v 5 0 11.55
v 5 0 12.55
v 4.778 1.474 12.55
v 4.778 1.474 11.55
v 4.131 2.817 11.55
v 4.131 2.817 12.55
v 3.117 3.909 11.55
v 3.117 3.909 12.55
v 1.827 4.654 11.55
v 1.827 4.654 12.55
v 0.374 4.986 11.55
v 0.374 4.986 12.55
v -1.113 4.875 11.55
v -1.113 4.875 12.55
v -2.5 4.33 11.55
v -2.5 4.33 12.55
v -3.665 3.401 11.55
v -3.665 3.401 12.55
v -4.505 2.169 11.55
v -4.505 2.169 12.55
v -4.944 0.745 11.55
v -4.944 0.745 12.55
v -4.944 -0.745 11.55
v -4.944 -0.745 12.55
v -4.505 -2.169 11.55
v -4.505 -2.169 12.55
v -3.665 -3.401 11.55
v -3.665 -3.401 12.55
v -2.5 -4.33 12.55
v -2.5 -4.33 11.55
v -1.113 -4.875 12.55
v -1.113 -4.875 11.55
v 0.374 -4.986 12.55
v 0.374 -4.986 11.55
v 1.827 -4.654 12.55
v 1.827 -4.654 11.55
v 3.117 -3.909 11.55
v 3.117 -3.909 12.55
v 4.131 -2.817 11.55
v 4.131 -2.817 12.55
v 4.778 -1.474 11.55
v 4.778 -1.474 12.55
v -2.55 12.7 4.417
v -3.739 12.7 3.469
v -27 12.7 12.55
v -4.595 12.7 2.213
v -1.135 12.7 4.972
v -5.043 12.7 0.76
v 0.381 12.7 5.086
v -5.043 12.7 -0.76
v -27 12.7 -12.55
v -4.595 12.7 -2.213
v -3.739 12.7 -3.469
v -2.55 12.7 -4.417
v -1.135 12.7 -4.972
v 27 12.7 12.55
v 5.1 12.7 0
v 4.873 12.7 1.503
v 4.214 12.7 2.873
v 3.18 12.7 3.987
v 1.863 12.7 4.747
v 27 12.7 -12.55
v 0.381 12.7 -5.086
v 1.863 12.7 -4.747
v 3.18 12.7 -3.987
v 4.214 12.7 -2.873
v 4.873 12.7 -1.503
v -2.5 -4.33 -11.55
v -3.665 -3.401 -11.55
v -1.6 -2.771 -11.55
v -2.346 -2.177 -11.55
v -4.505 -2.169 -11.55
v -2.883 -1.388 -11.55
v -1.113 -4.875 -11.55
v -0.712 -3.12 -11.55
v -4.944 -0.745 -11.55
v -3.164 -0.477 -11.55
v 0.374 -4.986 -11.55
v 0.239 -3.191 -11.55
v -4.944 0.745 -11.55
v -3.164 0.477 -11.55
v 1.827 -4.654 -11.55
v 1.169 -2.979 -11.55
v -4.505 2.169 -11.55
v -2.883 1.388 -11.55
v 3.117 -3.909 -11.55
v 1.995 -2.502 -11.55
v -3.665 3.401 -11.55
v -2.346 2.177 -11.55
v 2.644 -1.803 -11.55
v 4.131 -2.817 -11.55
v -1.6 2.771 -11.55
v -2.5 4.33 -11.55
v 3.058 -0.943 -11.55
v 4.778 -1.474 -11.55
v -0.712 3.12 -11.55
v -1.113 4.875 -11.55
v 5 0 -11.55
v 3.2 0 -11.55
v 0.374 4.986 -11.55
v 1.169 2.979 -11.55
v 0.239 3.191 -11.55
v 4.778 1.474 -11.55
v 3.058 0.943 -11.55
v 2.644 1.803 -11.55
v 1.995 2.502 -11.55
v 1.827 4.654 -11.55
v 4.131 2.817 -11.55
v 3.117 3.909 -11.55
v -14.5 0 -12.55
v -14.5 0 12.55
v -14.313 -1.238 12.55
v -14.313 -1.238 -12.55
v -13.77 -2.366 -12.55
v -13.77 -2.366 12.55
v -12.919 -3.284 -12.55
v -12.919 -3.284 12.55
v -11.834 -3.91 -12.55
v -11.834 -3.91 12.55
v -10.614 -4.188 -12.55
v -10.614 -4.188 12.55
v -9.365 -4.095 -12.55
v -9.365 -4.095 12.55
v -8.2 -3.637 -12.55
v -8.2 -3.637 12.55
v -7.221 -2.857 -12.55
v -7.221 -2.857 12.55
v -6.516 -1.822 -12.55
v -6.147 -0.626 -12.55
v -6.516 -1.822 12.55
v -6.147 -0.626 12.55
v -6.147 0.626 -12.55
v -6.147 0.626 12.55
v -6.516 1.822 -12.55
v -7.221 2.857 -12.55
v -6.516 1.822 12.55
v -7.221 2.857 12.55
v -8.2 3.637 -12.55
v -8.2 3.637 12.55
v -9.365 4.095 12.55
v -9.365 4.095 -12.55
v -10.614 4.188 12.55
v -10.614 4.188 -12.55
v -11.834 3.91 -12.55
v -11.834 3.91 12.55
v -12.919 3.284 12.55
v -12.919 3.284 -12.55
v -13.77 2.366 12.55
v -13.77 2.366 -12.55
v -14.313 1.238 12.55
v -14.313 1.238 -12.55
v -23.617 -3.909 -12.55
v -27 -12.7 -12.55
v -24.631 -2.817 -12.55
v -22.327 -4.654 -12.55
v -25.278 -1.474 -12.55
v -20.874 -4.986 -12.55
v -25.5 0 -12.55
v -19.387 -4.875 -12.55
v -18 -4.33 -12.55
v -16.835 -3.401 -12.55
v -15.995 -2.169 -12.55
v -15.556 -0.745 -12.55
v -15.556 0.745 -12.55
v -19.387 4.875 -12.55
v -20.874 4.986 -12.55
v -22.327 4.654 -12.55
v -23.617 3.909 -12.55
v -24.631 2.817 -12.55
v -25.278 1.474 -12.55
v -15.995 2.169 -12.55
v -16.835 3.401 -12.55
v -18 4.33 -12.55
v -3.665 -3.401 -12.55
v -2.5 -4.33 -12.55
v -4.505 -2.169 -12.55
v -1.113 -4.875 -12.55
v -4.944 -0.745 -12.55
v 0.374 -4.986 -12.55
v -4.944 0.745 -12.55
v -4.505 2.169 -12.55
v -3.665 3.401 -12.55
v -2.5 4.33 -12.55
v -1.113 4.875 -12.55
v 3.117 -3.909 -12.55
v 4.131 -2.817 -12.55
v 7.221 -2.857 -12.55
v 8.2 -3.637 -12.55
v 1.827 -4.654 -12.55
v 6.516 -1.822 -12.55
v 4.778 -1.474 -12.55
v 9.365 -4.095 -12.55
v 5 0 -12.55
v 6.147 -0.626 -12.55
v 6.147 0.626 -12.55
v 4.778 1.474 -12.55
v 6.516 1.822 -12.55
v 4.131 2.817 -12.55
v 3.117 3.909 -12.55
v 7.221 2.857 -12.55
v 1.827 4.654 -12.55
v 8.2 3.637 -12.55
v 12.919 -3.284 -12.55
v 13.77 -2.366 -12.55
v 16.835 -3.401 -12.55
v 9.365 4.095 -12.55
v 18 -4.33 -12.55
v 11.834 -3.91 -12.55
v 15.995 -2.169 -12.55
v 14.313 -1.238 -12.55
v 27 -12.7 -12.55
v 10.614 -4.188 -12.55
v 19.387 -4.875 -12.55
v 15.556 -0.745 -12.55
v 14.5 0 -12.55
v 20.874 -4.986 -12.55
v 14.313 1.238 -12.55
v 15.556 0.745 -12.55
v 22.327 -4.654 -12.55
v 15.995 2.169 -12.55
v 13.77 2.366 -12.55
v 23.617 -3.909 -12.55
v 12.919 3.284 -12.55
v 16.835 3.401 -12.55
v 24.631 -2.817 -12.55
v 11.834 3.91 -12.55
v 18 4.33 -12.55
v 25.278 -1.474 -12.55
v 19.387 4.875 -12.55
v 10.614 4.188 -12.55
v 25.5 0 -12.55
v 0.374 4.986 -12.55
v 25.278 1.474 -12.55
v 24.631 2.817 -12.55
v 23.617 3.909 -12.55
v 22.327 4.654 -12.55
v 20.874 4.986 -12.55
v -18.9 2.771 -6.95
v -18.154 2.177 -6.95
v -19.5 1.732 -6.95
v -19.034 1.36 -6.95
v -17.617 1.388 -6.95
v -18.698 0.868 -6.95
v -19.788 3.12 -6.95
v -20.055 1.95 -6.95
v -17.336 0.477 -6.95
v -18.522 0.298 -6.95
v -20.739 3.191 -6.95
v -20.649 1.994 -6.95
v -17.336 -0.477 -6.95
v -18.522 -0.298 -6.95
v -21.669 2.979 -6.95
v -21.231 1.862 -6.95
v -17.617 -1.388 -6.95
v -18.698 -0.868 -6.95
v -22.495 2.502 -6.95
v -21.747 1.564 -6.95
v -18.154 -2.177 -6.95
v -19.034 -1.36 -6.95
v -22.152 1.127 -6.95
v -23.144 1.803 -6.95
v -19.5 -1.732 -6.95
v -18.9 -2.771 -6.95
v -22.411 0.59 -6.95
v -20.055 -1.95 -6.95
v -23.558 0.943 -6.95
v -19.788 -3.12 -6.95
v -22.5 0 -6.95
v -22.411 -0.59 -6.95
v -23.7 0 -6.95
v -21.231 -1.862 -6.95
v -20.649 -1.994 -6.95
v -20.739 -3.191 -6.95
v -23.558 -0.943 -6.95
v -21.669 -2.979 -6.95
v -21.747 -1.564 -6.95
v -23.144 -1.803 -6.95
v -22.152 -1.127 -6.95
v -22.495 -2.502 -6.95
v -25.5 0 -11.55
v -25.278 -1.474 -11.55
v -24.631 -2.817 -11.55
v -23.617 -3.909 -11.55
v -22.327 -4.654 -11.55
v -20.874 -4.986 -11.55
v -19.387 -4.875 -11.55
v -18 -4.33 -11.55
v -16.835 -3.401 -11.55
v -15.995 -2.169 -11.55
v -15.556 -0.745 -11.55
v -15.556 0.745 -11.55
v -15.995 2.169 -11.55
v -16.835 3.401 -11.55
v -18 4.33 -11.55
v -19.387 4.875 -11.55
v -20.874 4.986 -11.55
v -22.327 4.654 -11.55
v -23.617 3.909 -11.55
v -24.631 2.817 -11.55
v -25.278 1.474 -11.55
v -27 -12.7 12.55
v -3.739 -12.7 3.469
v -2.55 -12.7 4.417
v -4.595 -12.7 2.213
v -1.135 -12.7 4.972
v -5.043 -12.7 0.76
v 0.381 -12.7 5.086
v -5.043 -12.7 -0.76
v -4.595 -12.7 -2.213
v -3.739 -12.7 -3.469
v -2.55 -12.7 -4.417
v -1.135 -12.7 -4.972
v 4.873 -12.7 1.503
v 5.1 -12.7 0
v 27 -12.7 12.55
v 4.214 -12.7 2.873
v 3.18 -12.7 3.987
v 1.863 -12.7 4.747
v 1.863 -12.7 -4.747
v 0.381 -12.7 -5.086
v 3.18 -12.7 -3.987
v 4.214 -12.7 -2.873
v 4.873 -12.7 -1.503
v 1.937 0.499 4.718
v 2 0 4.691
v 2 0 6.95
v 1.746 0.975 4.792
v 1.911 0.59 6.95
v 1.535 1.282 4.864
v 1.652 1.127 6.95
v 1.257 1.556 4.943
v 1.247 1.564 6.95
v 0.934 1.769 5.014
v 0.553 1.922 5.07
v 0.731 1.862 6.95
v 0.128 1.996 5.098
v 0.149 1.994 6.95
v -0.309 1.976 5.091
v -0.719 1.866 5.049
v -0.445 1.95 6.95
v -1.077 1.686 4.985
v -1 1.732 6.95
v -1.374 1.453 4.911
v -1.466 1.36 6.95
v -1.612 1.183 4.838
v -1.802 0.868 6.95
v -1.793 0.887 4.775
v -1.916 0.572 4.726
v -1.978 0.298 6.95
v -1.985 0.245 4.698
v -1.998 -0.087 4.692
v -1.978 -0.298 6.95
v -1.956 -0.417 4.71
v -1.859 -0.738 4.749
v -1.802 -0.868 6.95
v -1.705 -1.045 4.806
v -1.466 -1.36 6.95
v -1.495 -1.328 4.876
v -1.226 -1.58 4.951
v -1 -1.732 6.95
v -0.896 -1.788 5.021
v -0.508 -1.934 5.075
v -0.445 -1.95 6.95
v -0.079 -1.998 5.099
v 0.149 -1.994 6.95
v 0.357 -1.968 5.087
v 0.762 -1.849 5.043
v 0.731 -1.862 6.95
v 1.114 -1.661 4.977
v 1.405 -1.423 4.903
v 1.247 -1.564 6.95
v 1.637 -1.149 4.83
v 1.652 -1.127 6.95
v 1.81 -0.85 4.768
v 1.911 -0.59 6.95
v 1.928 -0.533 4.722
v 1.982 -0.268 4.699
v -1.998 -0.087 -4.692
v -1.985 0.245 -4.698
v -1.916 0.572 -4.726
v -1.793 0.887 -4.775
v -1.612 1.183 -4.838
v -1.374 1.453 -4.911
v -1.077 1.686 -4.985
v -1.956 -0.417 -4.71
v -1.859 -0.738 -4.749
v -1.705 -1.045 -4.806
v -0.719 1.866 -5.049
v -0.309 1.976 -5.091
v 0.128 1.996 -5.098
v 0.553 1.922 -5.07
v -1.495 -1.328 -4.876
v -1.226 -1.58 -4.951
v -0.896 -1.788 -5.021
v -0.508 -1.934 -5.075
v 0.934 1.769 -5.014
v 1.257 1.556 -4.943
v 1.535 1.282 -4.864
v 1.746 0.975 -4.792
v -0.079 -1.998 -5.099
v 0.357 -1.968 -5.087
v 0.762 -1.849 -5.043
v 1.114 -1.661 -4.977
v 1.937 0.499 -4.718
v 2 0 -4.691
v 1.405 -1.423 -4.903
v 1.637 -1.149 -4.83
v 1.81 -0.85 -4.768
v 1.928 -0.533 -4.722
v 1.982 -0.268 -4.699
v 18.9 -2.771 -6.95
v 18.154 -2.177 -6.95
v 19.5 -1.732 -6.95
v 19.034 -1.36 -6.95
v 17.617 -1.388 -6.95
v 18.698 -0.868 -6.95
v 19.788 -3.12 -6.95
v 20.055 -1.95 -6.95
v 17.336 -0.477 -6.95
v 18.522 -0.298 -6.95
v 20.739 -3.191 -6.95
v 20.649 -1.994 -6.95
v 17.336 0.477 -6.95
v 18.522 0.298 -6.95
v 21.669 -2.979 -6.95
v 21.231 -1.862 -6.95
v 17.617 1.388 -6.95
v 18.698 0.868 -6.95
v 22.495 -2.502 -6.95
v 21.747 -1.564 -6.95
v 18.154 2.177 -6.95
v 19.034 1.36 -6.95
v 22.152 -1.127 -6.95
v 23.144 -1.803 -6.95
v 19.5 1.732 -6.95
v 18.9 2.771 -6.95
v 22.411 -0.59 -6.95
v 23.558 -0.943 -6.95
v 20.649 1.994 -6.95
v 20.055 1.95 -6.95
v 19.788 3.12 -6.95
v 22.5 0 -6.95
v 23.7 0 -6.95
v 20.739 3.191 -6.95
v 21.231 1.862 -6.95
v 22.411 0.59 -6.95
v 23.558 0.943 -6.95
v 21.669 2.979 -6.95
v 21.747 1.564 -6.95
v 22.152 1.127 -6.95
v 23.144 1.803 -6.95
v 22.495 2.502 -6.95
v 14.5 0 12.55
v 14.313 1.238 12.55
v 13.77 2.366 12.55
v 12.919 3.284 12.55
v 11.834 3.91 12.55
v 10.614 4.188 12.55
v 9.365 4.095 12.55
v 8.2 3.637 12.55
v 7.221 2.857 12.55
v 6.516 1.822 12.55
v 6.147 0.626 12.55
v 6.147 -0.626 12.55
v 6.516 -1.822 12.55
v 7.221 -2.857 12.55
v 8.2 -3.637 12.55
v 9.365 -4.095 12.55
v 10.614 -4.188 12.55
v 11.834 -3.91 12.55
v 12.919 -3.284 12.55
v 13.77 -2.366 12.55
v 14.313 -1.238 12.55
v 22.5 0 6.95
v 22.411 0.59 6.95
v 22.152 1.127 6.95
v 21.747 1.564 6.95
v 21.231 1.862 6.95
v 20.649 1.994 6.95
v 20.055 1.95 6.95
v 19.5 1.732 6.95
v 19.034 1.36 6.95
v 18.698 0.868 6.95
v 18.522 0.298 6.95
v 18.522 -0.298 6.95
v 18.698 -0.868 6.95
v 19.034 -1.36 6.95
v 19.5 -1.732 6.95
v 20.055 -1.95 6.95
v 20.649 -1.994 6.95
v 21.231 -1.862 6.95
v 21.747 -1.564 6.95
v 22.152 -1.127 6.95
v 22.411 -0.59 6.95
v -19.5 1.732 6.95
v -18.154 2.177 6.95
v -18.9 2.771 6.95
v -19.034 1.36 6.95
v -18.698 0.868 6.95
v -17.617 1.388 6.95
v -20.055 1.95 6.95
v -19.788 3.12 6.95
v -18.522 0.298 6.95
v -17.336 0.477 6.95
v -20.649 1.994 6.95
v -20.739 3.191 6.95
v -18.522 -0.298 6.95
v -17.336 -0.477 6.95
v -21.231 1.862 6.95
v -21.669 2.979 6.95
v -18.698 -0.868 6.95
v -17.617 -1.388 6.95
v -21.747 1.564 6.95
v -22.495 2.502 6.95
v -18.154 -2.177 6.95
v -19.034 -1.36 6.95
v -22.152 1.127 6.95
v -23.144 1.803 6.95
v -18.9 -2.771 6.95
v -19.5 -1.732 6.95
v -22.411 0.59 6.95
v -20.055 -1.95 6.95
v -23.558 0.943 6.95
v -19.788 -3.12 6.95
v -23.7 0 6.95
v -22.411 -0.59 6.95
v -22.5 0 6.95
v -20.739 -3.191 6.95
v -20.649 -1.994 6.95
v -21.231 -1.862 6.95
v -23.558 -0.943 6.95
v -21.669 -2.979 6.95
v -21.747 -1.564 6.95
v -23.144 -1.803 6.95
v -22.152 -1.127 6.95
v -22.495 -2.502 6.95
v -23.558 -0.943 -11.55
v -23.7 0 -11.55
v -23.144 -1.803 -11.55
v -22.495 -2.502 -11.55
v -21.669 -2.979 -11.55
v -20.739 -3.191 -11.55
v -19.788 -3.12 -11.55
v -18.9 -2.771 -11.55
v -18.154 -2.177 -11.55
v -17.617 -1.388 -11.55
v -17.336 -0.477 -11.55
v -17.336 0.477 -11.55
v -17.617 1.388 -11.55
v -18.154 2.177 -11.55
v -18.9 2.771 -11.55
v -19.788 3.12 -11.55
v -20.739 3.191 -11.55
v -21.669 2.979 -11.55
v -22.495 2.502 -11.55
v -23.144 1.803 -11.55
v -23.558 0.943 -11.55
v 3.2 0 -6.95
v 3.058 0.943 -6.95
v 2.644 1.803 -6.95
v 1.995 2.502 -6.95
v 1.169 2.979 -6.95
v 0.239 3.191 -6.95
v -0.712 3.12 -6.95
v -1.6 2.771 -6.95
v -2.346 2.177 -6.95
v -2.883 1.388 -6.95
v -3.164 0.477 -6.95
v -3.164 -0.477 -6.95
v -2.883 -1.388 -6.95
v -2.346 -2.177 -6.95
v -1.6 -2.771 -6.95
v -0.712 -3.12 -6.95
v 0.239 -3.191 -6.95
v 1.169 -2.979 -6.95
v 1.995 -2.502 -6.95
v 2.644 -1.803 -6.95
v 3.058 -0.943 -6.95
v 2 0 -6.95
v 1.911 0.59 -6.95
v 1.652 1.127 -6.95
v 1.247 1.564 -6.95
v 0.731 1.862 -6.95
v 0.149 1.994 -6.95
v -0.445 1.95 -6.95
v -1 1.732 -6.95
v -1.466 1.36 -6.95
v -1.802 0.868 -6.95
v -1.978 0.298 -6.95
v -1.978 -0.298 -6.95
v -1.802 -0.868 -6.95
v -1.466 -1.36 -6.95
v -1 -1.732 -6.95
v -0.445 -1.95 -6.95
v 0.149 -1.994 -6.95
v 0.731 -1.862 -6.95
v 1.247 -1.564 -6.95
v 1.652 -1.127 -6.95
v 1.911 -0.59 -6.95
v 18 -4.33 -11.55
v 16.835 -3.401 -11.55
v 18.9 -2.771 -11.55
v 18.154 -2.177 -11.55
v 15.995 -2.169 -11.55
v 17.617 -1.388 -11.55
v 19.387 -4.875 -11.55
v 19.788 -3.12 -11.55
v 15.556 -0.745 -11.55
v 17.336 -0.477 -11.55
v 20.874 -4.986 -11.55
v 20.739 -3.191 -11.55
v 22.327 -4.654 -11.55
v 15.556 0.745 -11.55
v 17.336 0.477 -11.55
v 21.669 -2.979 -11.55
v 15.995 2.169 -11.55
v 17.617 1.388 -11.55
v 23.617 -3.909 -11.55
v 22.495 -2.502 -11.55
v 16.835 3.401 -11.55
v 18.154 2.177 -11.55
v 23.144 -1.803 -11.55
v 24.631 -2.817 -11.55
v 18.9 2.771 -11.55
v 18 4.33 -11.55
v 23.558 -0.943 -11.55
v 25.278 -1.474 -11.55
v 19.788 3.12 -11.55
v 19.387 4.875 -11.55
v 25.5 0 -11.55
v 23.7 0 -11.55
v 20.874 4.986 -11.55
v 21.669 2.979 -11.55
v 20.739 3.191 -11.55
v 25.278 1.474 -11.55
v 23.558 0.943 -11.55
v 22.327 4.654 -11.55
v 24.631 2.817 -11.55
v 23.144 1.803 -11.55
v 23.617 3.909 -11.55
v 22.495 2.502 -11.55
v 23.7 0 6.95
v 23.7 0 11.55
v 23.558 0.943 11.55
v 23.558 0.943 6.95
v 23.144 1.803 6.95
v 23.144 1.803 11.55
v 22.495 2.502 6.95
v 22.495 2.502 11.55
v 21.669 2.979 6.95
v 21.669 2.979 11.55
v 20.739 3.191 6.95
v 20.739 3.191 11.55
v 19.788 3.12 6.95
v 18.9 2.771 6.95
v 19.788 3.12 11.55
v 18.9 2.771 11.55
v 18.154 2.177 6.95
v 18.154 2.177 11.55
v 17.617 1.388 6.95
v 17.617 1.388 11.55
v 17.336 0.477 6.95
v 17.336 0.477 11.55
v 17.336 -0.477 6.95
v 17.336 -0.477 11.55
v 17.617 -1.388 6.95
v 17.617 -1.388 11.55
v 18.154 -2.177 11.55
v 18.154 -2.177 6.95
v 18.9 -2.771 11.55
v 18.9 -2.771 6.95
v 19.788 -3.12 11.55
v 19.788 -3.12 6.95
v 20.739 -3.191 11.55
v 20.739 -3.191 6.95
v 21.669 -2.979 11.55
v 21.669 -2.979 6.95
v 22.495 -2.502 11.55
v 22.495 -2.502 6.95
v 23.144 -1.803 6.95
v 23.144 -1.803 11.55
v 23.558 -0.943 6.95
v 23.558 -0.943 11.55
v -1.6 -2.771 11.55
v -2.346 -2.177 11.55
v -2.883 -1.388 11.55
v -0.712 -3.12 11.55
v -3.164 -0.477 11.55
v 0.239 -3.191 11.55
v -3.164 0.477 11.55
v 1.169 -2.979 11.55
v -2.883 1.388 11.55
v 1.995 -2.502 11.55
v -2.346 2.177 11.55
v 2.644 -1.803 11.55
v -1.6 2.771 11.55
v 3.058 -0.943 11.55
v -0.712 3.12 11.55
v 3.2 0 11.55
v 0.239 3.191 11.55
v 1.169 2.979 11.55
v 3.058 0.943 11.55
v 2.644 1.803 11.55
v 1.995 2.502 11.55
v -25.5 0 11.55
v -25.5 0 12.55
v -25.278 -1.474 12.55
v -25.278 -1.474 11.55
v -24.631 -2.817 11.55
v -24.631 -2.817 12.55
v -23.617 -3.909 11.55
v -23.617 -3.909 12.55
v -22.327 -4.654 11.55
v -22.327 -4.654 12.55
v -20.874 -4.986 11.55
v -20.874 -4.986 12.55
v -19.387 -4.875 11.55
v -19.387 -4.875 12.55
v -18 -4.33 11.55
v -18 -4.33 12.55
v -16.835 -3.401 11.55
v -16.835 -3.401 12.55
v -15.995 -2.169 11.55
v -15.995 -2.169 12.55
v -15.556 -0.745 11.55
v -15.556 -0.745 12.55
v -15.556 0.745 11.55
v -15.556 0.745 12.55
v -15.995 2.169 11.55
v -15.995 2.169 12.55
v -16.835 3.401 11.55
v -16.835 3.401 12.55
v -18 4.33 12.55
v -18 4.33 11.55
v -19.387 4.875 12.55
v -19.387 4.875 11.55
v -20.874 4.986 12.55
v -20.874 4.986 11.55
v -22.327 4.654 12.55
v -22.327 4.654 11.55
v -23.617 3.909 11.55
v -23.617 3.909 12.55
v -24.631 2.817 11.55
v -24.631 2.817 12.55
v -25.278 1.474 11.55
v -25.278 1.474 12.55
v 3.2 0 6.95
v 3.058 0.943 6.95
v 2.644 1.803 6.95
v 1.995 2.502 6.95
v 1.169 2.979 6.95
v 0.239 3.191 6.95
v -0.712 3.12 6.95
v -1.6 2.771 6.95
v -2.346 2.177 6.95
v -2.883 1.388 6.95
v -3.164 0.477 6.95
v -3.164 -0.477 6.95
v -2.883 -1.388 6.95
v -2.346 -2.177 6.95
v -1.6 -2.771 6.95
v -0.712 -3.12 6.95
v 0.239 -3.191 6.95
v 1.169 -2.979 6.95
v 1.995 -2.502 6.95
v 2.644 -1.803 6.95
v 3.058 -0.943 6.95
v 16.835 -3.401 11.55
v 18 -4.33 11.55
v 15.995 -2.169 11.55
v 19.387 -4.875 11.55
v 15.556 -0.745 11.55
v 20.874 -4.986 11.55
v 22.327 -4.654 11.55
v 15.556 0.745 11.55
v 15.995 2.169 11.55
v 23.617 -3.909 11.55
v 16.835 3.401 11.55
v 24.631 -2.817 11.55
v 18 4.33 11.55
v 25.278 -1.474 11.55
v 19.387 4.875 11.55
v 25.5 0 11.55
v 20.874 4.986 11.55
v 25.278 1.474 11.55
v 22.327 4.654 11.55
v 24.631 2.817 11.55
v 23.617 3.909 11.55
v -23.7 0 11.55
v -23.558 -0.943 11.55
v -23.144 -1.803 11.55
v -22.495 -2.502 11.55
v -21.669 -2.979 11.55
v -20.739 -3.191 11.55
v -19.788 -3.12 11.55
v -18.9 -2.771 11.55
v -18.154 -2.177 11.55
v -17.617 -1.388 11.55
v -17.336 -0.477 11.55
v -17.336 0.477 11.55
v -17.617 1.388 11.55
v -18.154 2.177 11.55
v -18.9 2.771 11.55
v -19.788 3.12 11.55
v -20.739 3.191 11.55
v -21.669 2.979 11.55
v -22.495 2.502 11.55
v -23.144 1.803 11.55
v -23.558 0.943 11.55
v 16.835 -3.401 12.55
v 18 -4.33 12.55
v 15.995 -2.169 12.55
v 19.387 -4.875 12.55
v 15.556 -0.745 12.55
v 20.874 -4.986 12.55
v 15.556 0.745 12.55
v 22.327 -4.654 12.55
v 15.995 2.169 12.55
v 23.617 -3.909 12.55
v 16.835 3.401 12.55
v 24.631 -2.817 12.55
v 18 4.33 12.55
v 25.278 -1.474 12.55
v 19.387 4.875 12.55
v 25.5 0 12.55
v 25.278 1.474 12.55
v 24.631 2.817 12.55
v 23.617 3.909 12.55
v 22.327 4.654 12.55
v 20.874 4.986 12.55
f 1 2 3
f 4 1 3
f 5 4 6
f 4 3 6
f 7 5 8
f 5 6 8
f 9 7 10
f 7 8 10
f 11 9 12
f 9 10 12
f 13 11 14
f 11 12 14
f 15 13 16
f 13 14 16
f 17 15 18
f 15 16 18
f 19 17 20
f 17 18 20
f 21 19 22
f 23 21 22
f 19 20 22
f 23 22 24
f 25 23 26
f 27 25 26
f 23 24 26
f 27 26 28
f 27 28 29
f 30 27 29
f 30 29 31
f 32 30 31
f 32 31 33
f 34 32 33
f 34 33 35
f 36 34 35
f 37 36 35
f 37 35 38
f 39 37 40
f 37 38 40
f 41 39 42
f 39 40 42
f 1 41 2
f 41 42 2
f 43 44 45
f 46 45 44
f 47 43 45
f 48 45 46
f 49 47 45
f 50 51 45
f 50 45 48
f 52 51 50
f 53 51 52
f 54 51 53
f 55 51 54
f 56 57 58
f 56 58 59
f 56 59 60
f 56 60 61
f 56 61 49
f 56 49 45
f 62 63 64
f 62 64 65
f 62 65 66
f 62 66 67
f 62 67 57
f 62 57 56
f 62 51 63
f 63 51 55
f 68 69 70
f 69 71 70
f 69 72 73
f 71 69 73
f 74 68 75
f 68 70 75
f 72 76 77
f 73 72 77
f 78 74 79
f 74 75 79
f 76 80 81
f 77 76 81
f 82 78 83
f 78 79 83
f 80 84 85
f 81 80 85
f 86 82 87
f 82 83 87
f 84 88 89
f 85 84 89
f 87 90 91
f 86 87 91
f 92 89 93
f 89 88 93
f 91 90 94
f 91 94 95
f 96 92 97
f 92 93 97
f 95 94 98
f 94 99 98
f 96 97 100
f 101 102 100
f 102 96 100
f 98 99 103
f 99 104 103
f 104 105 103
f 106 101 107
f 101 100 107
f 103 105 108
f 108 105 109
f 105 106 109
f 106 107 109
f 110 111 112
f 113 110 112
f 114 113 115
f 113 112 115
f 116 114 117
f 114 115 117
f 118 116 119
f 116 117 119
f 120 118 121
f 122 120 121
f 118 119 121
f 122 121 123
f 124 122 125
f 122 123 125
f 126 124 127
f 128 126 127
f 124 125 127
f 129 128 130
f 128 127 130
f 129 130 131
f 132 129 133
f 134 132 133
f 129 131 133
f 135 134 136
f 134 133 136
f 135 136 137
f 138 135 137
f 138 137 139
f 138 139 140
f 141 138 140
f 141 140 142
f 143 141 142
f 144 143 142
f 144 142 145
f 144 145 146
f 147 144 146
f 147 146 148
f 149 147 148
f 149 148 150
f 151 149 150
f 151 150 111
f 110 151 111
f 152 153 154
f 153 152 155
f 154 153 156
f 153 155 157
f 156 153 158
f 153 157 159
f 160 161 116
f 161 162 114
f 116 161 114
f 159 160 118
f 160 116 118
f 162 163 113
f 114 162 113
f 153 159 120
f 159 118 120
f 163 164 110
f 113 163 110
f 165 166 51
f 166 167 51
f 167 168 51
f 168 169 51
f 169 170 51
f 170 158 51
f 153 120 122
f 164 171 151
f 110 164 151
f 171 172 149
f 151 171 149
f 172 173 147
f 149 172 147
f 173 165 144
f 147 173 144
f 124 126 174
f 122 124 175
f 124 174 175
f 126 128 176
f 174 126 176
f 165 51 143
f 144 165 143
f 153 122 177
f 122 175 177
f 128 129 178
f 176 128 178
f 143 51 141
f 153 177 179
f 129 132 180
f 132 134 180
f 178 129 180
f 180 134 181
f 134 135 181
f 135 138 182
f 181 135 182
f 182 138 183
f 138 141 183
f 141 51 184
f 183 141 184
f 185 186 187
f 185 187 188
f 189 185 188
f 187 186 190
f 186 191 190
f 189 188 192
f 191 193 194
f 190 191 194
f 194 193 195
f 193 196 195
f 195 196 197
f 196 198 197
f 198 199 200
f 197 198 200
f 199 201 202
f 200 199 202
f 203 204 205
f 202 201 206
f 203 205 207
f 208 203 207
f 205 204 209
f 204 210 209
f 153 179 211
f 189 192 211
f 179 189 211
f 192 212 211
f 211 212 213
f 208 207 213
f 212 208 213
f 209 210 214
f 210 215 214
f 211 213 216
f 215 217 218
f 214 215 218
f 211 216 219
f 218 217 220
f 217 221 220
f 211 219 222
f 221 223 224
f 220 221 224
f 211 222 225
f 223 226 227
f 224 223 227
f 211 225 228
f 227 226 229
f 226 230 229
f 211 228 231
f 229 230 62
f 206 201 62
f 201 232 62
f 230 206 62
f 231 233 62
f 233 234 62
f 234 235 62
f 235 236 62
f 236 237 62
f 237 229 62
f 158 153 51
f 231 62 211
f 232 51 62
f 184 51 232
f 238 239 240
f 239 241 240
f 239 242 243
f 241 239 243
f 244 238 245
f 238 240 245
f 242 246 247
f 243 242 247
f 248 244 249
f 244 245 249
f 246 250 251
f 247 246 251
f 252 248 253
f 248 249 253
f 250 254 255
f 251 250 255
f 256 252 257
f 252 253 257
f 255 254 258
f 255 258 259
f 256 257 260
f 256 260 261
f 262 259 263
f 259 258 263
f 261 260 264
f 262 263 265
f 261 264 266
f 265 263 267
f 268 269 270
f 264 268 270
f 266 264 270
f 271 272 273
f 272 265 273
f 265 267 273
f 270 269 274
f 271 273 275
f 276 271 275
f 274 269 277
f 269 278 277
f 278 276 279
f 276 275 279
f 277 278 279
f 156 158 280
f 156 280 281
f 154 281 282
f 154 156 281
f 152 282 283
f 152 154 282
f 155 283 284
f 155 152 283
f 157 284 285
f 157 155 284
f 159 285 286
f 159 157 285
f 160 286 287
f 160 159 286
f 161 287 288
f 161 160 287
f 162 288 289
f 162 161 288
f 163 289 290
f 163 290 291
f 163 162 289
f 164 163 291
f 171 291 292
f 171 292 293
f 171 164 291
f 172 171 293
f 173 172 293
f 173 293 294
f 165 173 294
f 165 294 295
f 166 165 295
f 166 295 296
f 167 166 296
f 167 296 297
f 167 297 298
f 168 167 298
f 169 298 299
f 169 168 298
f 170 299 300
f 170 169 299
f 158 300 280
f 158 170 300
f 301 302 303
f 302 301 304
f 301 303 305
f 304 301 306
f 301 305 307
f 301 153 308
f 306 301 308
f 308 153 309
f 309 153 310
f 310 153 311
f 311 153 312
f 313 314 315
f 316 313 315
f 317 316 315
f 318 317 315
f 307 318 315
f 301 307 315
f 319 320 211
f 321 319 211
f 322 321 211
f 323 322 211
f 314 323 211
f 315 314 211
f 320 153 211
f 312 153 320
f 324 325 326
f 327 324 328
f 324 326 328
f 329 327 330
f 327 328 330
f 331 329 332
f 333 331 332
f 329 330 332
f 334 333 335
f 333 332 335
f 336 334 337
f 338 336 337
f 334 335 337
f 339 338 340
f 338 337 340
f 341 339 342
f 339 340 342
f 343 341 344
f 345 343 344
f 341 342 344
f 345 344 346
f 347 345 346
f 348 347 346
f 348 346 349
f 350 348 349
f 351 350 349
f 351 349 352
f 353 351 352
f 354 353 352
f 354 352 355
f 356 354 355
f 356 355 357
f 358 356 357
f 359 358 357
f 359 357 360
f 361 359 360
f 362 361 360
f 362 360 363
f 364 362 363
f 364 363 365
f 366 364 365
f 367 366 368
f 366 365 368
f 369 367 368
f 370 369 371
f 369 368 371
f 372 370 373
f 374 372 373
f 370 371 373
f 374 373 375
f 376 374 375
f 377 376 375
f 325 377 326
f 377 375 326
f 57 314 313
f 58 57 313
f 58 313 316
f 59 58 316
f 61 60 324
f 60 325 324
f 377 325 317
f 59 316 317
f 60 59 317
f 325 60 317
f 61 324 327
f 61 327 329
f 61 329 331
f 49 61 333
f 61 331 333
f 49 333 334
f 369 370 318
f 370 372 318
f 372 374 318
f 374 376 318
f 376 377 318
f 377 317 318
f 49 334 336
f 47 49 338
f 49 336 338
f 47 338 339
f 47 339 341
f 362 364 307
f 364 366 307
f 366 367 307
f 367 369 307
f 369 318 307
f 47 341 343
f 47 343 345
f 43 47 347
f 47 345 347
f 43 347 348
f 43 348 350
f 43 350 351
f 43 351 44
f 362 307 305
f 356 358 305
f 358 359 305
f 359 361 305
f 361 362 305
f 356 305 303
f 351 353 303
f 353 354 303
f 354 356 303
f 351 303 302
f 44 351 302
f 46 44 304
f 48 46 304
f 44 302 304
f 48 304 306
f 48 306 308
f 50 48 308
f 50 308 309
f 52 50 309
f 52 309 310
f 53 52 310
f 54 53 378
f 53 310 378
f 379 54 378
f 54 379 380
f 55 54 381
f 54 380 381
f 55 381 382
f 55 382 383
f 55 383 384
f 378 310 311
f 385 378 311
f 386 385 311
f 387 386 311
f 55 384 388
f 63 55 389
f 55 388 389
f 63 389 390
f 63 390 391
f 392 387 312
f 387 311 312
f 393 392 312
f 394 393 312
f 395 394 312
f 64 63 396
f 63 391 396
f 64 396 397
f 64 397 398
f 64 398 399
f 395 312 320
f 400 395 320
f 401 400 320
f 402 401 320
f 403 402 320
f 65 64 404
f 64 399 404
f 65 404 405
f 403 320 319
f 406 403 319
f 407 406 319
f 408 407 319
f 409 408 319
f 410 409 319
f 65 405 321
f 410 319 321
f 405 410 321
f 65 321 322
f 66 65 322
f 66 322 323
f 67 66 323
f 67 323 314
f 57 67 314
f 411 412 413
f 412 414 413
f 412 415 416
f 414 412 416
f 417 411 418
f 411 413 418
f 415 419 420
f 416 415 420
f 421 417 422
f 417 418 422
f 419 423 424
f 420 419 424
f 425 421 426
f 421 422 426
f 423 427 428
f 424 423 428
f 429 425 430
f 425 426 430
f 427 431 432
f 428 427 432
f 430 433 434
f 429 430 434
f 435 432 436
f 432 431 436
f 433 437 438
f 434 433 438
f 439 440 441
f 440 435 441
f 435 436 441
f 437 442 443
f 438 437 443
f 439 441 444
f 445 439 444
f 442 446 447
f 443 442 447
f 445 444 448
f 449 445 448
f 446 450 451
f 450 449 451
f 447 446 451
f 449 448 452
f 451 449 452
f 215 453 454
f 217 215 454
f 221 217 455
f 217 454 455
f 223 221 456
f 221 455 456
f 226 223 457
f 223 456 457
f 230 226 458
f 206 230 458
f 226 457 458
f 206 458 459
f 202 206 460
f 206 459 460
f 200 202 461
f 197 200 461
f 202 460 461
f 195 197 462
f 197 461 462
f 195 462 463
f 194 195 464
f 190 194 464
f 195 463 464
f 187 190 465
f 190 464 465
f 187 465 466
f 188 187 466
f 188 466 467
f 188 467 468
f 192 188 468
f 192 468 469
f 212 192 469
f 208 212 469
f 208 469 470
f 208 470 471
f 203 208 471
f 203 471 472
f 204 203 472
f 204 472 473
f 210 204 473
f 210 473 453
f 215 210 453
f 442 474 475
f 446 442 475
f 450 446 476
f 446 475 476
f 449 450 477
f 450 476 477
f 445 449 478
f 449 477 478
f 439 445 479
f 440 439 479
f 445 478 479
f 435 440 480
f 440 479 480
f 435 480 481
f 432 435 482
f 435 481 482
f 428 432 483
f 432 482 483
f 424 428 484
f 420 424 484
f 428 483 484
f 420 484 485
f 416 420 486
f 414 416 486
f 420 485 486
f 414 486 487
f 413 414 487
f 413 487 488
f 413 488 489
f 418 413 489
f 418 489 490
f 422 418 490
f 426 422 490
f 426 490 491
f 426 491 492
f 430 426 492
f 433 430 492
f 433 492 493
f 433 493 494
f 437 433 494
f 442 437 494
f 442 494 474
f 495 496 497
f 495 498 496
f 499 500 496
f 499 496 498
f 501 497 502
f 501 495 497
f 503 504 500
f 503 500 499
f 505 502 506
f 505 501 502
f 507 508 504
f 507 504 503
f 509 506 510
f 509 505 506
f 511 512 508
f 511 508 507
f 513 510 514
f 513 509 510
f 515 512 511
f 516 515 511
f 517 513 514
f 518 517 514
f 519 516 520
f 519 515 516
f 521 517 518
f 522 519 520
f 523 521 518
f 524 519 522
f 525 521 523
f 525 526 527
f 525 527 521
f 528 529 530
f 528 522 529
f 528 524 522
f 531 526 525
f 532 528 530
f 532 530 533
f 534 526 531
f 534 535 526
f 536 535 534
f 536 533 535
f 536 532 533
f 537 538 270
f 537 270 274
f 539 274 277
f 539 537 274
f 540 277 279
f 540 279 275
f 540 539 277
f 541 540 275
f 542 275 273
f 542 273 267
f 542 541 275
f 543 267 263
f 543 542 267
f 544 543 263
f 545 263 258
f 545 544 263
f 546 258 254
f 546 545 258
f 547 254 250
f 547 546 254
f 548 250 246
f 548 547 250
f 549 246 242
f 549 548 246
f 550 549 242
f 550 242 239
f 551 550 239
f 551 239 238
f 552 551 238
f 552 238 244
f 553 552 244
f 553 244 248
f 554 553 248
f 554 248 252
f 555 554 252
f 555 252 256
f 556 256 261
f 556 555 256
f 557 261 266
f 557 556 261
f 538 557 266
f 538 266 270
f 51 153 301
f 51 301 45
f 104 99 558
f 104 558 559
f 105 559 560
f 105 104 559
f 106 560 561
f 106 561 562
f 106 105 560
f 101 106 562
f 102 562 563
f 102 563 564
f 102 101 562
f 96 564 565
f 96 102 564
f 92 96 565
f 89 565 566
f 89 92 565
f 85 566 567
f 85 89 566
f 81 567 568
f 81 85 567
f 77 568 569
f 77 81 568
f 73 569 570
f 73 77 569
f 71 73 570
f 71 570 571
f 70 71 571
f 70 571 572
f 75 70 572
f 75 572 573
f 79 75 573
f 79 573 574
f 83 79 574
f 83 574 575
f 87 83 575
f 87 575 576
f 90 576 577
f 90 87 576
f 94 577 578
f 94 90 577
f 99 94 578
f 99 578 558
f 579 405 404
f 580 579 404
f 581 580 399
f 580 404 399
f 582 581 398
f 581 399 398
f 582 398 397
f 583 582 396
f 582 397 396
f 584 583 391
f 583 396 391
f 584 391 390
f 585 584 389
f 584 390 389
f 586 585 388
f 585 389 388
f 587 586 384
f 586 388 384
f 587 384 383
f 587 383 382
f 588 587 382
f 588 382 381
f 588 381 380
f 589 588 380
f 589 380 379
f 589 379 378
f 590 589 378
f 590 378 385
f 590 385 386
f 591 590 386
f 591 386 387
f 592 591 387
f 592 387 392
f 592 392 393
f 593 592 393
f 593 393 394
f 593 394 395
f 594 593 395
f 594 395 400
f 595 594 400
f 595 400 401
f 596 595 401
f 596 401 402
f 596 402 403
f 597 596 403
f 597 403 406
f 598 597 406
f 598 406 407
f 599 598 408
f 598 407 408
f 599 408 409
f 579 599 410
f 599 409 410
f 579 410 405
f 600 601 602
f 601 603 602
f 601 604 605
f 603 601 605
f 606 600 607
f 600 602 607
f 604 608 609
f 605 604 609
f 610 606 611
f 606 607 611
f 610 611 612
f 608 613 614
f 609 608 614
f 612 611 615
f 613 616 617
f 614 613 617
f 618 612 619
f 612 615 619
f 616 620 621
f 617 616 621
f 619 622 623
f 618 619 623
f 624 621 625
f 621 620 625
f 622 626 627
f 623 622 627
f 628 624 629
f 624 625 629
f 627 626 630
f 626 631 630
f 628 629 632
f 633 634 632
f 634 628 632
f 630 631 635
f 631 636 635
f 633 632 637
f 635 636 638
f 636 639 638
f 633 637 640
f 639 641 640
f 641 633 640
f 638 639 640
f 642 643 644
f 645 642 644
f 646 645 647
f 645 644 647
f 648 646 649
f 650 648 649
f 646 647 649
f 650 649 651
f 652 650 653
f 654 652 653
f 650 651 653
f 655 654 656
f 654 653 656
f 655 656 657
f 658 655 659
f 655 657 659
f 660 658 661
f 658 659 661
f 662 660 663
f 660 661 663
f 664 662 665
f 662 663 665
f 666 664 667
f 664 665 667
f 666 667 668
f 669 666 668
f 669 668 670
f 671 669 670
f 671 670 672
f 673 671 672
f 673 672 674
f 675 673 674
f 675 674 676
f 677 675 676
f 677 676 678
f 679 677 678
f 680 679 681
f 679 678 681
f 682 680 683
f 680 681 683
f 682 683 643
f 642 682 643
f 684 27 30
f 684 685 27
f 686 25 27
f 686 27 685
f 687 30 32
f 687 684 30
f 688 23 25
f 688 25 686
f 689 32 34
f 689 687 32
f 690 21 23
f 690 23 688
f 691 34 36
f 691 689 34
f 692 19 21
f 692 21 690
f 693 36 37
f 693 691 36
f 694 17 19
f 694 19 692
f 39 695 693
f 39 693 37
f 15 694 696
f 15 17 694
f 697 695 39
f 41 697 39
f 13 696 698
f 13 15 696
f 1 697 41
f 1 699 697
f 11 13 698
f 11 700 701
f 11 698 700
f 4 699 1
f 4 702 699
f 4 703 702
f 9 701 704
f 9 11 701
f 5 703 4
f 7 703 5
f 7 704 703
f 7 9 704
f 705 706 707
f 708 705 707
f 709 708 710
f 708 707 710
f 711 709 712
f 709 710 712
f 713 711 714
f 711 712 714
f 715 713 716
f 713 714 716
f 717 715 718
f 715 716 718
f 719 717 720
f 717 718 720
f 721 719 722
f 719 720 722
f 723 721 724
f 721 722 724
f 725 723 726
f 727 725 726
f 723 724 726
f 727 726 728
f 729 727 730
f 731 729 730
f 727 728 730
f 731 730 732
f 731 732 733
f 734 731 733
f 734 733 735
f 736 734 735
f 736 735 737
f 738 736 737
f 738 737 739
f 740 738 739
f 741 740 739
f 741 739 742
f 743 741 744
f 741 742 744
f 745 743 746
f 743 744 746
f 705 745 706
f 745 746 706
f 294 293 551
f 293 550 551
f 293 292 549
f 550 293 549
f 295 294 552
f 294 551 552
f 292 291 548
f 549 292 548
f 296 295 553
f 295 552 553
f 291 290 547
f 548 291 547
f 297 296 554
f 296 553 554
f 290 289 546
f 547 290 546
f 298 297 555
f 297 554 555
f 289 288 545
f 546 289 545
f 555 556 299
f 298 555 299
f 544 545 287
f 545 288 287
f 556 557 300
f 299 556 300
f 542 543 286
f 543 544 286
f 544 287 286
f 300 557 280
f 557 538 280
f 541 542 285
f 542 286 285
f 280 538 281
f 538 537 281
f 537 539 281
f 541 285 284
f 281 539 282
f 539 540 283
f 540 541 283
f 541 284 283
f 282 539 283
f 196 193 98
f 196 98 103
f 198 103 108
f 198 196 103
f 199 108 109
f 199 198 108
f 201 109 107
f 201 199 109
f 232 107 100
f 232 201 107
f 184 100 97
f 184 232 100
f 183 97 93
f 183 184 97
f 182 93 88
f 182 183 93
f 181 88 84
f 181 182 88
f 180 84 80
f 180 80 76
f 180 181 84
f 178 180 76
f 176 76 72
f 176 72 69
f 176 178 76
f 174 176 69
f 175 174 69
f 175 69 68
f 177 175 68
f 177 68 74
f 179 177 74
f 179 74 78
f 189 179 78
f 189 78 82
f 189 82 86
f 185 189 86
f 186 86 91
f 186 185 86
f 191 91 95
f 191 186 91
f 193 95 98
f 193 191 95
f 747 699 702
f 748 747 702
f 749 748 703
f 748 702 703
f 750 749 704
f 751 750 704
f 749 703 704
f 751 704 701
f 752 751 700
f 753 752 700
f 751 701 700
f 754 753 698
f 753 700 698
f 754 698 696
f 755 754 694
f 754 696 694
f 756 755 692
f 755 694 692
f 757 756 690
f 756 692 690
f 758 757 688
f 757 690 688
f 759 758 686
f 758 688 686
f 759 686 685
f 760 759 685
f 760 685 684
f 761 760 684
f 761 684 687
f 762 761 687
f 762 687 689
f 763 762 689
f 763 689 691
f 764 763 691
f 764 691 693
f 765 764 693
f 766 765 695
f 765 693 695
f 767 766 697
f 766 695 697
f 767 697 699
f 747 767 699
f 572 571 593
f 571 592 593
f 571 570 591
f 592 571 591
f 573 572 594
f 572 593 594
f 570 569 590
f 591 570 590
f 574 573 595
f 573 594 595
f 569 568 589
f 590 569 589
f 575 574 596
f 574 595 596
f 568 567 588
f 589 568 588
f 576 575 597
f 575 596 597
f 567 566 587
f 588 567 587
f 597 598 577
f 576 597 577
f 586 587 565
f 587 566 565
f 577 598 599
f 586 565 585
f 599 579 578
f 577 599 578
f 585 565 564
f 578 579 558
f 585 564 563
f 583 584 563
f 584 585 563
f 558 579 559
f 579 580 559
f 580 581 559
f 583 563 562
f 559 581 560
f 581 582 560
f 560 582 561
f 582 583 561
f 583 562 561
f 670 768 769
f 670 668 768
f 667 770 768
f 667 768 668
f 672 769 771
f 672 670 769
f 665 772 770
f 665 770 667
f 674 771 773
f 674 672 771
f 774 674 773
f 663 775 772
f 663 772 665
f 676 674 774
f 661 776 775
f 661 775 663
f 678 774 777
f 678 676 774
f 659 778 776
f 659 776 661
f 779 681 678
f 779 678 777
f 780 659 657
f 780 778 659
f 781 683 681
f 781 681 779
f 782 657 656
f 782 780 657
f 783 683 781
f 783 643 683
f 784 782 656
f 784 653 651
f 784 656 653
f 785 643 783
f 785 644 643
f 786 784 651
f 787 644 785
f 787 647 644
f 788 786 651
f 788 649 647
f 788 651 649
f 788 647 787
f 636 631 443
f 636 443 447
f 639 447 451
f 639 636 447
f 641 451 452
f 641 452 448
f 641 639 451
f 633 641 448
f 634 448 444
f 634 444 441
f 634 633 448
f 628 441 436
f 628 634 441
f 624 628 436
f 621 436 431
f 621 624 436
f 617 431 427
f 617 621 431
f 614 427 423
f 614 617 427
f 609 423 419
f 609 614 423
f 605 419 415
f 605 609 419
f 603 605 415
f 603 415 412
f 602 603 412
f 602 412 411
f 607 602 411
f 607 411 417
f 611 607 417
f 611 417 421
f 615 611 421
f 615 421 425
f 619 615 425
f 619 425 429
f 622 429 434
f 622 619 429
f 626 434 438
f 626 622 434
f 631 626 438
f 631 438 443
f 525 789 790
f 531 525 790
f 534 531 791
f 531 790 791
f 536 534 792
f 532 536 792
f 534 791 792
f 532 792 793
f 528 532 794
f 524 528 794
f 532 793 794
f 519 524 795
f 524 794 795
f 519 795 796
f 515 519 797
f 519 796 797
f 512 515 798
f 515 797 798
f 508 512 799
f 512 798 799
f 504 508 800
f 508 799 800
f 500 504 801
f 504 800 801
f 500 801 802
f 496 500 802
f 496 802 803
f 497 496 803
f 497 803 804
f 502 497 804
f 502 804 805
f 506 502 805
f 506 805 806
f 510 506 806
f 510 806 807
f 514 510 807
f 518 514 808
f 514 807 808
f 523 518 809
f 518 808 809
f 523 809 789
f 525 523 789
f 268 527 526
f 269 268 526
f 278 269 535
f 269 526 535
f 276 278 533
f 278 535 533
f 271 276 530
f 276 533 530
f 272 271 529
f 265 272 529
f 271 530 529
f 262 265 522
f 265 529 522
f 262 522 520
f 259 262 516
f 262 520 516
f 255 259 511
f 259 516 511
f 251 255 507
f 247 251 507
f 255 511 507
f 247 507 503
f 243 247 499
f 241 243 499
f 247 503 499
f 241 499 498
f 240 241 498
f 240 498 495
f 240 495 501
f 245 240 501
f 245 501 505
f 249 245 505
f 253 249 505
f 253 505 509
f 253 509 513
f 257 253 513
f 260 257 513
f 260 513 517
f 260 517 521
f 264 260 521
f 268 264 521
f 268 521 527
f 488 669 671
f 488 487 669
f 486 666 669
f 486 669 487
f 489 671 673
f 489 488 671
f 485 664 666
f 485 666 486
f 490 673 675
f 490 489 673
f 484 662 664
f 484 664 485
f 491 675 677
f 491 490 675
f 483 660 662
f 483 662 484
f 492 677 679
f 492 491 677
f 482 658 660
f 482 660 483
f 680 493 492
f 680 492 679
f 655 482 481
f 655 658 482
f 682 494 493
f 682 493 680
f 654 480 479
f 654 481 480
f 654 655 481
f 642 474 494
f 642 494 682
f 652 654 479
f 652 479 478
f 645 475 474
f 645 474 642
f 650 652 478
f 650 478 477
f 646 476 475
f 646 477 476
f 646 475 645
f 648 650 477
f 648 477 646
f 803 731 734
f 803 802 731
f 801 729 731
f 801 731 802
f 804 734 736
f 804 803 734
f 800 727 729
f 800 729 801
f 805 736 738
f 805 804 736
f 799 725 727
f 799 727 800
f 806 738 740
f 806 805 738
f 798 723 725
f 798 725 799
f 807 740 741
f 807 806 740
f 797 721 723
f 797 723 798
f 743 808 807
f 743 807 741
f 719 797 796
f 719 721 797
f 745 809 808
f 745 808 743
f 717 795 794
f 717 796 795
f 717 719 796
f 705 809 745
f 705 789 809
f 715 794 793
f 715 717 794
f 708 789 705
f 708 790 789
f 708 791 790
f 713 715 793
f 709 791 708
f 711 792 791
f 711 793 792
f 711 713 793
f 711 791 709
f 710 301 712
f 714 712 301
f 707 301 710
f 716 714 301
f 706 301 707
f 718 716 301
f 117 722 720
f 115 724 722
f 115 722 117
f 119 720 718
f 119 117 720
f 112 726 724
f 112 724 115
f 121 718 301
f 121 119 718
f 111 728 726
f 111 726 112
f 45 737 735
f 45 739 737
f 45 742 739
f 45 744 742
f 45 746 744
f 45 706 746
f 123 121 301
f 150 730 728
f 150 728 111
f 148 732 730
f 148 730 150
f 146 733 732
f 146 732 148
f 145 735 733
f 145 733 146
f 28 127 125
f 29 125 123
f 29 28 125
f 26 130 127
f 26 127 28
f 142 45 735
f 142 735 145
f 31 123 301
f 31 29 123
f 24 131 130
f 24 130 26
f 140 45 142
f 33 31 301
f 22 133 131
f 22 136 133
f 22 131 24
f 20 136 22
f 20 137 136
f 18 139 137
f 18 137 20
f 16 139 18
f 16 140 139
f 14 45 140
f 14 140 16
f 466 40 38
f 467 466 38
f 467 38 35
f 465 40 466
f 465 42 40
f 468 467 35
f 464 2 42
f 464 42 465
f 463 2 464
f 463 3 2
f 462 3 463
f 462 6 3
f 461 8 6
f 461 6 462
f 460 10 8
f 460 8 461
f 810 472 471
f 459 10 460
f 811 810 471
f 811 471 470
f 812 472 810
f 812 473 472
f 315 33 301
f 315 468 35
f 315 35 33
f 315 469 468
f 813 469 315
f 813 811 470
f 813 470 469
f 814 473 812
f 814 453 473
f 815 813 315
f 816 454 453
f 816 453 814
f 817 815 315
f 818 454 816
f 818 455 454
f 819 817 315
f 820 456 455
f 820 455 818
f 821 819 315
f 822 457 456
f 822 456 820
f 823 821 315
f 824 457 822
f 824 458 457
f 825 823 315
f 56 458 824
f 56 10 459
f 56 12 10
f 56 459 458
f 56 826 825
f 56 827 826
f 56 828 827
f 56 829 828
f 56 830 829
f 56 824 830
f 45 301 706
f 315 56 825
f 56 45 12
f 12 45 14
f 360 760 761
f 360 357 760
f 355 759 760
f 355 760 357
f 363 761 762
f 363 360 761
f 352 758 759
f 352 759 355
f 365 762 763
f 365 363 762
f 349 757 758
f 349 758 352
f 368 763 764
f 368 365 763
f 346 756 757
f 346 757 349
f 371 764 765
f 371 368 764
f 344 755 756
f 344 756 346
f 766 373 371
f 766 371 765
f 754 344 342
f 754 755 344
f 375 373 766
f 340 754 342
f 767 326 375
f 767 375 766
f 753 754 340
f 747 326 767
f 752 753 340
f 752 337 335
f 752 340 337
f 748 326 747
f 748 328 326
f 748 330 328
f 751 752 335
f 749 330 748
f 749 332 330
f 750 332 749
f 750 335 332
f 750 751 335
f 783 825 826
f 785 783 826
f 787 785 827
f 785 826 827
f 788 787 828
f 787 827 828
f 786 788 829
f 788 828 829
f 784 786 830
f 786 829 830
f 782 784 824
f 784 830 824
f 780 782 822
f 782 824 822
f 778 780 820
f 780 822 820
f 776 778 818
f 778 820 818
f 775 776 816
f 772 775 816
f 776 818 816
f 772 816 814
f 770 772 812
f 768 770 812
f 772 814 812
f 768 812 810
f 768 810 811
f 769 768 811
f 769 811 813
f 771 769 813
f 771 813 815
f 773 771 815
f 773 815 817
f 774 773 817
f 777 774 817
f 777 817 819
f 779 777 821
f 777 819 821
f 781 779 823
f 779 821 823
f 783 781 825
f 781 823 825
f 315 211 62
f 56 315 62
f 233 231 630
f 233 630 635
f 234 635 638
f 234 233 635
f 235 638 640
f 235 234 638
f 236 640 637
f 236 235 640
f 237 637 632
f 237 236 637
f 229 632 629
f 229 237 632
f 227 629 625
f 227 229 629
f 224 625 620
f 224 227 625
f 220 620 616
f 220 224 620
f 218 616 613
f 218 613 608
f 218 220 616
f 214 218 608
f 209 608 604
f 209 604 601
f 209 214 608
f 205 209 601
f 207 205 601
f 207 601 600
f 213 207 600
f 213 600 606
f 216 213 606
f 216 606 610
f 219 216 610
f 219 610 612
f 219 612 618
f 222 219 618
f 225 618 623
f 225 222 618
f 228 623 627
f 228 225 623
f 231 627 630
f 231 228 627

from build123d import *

# Parameters (mm, degrees)
BOSS_EXTRUDE1_DEPTH      = 12.55
BOSS_EXTRUDE1_DEPTH_BACK = 12.55
SKETCH1_W                = 54
SKETCH1_H                = 25.4
CUT_EXTRUDE1_REACH       = 41.136
SKETCH3_R                = 5.1
SKETCH5_R                = 5
CUT_EXTRUDE2_DEPTH       = 1
SKETCH6_R                = 3.2
CUT_EXTRUDE3_DEPTH       = 4.6
CUT_EXTRUDE4_REACH       = 37.645
SKETCH7_R                = 2
CUT_EXTRUDE5_REACH       = 40.991
SKETCH8_R                = 4.2
SKETCH9_R                = 5
CUT_EXTRUDE6_DEPTH       = 1
SKETCH10_R               = 3.2
CUT_EXTRUDE7_DEPTH       = 4.6
SKETCH11_R               = 2
CUT_EXTRUDE8_DEPTH       = 36.64463494


with BuildPart() as part:
    # Sketch1 → Boss-Extrude1 (new, two sides: drawn at the far end of the back side and taken through both)
    with BuildSketch(Plane.XY.offset(-BOSS_EXTRUDE1_DEPTH_BACK)):
        Rectangle(SKETCH1_W, SKETCH1_H)
    extrude(amount=BOSS_EXTRUDE1_DEPTH + BOSS_EXTRUDE1_DEPTH_BACK)

    # Sketch3 → Cut-Extrude1 (cut, up to next)
    with BuildSketch(Plane.XZ.offset(12.7), mode=Mode.PRIVATE) as cut_extrude1_sk1:
        Circle(SKETCH3_R)
    cut_extrude1_tool1 = extrude(cut_extrude1_sk1.sketch, amount=-CUT_EXTRUDE1_REACH, mode=Mode.PRIVATE) & part.part
    add(cut_extrude1_tool1.solids().sort_by_distance((0, -12.7, 0))[0], mode=Mode.SUBTRACT)

    # Sketch5 → Cut-Extrude2 (cut)
    with BuildSketch(Plane.XY.offset(12.55)):
        with Locations((20.5, 0)):
            Circle(SKETCH5_R)
        with Locations((-20.5, 0)):
            Circle(SKETCH5_R)
    cut_extrude2 = extrude(amount=-CUT_EXTRUDE2_DEPTH, mode=Mode.SUBTRACT)

    # Sketch6 → Cut-Extrude3 (cut)
    with BuildSketch(Plane.XY.offset(11.55)):
        with Locations((20.5, 0)):
            Circle(SKETCH6_R)
        with Locations((-20.5, 0)):
            Circle(SKETCH6_R)
    cut_extrude3 = extrude(amount=-CUT_EXTRUDE3_DEPTH, mode=Mode.SUBTRACT)

    # Sketch7 → Cut-Extrude4 (cut, up to next)
    with BuildSketch(Plane.XY.offset(6.95), mode=Mode.PRIVATE) as cut_extrude4_sk1:
        with Locations((20.5, 0)):
            Circle(SKETCH7_R)
    cut_extrude4_tool1 = extrude(cut_extrude4_sk1.sketch, amount=-CUT_EXTRUDE4_REACH, mode=Mode.PRIVATE) & part.part
    # Sketch7 → Cut-Extrude4 (cut, up to next)
    with BuildSketch(Plane.XY.offset(6.95), mode=Mode.PRIVATE) as cut_extrude4_sk2:
        with Locations((-20.5, 0)):
            Circle(SKETCH7_R)
    cut_extrude4_tool2 = extrude(cut_extrude4_sk2.sketch, amount=-CUT_EXTRUDE4_REACH, mode=Mode.PRIVATE) & part.part
    add(cut_extrude4_tool1.solids().sort_by_distance((20.5, 0, 6.95))[0], mode=Mode.SUBTRACT)
    add(cut_extrude4_tool2.solids().sort_by_distance((-20.5, 0, 6.95))[0], mode=Mode.SUBTRACT)

    # Mirror1: Cut-Extrude2 across plane
    add(cut_extrude2.mirror(Plane.XY), mode=Mode.SUBTRACT)

    # Mirror2: Cut-Extrude3 across plane
    add(cut_extrude3.mirror(Plane.XY), mode=Mode.SUBTRACT)

    # Sketch8 → Cut-Extrude5 (cut, up to next)
    with BuildSketch(Plane.XY.offset(12.55), mode=Mode.PRIVATE) as cut_extrude5_sk1:
        with Locations((10.3, 0)):
            Circle(SKETCH8_R)
    cut_extrude5_tool1 = extrude(cut_extrude5_sk1.sketch, amount=-CUT_EXTRUDE5_REACH, mode=Mode.PRIVATE) & part.part
    # Sketch8 → Cut-Extrude5 (cut, up to next)
    with BuildSketch(Plane.XY.offset(12.55), mode=Mode.PRIVATE) as cut_extrude5_sk2:
        with Locations((-10.3, 0)):
            Circle(SKETCH8_R)
    cut_extrude5_tool2 = extrude(cut_extrude5_sk2.sketch, amount=-CUT_EXTRUDE5_REACH, mode=Mode.PRIVATE) & part.part
    add(cut_extrude5_tool1.solids().sort_by_distance((10.3, 0, 12.55))[0], mode=Mode.SUBTRACT)
    add(cut_extrude5_tool2.solids().sort_by_distance((-10.3, 0, 12.55))[0], mode=Mode.SUBTRACT)

    # Sketch9 → Cut-Extrude6 (cut)
    with BuildSketch(Plane.XY.offset(12.55)):
        Circle(SKETCH9_R)
    cut_extrude6 = extrude(amount=-CUT_EXTRUDE6_DEPTH, mode=Mode.SUBTRACT)

    # Sketch10 → Cut-Extrude7 (cut)
    with BuildSketch(Plane.XY.offset(11.55)):
        Circle(SKETCH10_R)
    cut_extrude7 = extrude(amount=-CUT_EXTRUDE7_DEPTH, mode=Mode.SUBTRACT)

    # Sketch11 → Cut-Extrude8 (cut, through all)
    with BuildSketch(Plane.XY.offset(6.95)):
        Circle(SKETCH11_R)
    extrude(amount=-CUT_EXTRUDE8_DEPTH, mode=Mode.SUBTRACT)

    # Mirror3: Cut-Extrude6, Cut-Extrude7 across plane
    add(cut_extrude6.mirror(Plane.XY), mode=Mode.SUBTRACT)
    add(cut_extrude7.mirror(Plane.XY), mode=Mode.SUBTRACT)


solid = part.part
